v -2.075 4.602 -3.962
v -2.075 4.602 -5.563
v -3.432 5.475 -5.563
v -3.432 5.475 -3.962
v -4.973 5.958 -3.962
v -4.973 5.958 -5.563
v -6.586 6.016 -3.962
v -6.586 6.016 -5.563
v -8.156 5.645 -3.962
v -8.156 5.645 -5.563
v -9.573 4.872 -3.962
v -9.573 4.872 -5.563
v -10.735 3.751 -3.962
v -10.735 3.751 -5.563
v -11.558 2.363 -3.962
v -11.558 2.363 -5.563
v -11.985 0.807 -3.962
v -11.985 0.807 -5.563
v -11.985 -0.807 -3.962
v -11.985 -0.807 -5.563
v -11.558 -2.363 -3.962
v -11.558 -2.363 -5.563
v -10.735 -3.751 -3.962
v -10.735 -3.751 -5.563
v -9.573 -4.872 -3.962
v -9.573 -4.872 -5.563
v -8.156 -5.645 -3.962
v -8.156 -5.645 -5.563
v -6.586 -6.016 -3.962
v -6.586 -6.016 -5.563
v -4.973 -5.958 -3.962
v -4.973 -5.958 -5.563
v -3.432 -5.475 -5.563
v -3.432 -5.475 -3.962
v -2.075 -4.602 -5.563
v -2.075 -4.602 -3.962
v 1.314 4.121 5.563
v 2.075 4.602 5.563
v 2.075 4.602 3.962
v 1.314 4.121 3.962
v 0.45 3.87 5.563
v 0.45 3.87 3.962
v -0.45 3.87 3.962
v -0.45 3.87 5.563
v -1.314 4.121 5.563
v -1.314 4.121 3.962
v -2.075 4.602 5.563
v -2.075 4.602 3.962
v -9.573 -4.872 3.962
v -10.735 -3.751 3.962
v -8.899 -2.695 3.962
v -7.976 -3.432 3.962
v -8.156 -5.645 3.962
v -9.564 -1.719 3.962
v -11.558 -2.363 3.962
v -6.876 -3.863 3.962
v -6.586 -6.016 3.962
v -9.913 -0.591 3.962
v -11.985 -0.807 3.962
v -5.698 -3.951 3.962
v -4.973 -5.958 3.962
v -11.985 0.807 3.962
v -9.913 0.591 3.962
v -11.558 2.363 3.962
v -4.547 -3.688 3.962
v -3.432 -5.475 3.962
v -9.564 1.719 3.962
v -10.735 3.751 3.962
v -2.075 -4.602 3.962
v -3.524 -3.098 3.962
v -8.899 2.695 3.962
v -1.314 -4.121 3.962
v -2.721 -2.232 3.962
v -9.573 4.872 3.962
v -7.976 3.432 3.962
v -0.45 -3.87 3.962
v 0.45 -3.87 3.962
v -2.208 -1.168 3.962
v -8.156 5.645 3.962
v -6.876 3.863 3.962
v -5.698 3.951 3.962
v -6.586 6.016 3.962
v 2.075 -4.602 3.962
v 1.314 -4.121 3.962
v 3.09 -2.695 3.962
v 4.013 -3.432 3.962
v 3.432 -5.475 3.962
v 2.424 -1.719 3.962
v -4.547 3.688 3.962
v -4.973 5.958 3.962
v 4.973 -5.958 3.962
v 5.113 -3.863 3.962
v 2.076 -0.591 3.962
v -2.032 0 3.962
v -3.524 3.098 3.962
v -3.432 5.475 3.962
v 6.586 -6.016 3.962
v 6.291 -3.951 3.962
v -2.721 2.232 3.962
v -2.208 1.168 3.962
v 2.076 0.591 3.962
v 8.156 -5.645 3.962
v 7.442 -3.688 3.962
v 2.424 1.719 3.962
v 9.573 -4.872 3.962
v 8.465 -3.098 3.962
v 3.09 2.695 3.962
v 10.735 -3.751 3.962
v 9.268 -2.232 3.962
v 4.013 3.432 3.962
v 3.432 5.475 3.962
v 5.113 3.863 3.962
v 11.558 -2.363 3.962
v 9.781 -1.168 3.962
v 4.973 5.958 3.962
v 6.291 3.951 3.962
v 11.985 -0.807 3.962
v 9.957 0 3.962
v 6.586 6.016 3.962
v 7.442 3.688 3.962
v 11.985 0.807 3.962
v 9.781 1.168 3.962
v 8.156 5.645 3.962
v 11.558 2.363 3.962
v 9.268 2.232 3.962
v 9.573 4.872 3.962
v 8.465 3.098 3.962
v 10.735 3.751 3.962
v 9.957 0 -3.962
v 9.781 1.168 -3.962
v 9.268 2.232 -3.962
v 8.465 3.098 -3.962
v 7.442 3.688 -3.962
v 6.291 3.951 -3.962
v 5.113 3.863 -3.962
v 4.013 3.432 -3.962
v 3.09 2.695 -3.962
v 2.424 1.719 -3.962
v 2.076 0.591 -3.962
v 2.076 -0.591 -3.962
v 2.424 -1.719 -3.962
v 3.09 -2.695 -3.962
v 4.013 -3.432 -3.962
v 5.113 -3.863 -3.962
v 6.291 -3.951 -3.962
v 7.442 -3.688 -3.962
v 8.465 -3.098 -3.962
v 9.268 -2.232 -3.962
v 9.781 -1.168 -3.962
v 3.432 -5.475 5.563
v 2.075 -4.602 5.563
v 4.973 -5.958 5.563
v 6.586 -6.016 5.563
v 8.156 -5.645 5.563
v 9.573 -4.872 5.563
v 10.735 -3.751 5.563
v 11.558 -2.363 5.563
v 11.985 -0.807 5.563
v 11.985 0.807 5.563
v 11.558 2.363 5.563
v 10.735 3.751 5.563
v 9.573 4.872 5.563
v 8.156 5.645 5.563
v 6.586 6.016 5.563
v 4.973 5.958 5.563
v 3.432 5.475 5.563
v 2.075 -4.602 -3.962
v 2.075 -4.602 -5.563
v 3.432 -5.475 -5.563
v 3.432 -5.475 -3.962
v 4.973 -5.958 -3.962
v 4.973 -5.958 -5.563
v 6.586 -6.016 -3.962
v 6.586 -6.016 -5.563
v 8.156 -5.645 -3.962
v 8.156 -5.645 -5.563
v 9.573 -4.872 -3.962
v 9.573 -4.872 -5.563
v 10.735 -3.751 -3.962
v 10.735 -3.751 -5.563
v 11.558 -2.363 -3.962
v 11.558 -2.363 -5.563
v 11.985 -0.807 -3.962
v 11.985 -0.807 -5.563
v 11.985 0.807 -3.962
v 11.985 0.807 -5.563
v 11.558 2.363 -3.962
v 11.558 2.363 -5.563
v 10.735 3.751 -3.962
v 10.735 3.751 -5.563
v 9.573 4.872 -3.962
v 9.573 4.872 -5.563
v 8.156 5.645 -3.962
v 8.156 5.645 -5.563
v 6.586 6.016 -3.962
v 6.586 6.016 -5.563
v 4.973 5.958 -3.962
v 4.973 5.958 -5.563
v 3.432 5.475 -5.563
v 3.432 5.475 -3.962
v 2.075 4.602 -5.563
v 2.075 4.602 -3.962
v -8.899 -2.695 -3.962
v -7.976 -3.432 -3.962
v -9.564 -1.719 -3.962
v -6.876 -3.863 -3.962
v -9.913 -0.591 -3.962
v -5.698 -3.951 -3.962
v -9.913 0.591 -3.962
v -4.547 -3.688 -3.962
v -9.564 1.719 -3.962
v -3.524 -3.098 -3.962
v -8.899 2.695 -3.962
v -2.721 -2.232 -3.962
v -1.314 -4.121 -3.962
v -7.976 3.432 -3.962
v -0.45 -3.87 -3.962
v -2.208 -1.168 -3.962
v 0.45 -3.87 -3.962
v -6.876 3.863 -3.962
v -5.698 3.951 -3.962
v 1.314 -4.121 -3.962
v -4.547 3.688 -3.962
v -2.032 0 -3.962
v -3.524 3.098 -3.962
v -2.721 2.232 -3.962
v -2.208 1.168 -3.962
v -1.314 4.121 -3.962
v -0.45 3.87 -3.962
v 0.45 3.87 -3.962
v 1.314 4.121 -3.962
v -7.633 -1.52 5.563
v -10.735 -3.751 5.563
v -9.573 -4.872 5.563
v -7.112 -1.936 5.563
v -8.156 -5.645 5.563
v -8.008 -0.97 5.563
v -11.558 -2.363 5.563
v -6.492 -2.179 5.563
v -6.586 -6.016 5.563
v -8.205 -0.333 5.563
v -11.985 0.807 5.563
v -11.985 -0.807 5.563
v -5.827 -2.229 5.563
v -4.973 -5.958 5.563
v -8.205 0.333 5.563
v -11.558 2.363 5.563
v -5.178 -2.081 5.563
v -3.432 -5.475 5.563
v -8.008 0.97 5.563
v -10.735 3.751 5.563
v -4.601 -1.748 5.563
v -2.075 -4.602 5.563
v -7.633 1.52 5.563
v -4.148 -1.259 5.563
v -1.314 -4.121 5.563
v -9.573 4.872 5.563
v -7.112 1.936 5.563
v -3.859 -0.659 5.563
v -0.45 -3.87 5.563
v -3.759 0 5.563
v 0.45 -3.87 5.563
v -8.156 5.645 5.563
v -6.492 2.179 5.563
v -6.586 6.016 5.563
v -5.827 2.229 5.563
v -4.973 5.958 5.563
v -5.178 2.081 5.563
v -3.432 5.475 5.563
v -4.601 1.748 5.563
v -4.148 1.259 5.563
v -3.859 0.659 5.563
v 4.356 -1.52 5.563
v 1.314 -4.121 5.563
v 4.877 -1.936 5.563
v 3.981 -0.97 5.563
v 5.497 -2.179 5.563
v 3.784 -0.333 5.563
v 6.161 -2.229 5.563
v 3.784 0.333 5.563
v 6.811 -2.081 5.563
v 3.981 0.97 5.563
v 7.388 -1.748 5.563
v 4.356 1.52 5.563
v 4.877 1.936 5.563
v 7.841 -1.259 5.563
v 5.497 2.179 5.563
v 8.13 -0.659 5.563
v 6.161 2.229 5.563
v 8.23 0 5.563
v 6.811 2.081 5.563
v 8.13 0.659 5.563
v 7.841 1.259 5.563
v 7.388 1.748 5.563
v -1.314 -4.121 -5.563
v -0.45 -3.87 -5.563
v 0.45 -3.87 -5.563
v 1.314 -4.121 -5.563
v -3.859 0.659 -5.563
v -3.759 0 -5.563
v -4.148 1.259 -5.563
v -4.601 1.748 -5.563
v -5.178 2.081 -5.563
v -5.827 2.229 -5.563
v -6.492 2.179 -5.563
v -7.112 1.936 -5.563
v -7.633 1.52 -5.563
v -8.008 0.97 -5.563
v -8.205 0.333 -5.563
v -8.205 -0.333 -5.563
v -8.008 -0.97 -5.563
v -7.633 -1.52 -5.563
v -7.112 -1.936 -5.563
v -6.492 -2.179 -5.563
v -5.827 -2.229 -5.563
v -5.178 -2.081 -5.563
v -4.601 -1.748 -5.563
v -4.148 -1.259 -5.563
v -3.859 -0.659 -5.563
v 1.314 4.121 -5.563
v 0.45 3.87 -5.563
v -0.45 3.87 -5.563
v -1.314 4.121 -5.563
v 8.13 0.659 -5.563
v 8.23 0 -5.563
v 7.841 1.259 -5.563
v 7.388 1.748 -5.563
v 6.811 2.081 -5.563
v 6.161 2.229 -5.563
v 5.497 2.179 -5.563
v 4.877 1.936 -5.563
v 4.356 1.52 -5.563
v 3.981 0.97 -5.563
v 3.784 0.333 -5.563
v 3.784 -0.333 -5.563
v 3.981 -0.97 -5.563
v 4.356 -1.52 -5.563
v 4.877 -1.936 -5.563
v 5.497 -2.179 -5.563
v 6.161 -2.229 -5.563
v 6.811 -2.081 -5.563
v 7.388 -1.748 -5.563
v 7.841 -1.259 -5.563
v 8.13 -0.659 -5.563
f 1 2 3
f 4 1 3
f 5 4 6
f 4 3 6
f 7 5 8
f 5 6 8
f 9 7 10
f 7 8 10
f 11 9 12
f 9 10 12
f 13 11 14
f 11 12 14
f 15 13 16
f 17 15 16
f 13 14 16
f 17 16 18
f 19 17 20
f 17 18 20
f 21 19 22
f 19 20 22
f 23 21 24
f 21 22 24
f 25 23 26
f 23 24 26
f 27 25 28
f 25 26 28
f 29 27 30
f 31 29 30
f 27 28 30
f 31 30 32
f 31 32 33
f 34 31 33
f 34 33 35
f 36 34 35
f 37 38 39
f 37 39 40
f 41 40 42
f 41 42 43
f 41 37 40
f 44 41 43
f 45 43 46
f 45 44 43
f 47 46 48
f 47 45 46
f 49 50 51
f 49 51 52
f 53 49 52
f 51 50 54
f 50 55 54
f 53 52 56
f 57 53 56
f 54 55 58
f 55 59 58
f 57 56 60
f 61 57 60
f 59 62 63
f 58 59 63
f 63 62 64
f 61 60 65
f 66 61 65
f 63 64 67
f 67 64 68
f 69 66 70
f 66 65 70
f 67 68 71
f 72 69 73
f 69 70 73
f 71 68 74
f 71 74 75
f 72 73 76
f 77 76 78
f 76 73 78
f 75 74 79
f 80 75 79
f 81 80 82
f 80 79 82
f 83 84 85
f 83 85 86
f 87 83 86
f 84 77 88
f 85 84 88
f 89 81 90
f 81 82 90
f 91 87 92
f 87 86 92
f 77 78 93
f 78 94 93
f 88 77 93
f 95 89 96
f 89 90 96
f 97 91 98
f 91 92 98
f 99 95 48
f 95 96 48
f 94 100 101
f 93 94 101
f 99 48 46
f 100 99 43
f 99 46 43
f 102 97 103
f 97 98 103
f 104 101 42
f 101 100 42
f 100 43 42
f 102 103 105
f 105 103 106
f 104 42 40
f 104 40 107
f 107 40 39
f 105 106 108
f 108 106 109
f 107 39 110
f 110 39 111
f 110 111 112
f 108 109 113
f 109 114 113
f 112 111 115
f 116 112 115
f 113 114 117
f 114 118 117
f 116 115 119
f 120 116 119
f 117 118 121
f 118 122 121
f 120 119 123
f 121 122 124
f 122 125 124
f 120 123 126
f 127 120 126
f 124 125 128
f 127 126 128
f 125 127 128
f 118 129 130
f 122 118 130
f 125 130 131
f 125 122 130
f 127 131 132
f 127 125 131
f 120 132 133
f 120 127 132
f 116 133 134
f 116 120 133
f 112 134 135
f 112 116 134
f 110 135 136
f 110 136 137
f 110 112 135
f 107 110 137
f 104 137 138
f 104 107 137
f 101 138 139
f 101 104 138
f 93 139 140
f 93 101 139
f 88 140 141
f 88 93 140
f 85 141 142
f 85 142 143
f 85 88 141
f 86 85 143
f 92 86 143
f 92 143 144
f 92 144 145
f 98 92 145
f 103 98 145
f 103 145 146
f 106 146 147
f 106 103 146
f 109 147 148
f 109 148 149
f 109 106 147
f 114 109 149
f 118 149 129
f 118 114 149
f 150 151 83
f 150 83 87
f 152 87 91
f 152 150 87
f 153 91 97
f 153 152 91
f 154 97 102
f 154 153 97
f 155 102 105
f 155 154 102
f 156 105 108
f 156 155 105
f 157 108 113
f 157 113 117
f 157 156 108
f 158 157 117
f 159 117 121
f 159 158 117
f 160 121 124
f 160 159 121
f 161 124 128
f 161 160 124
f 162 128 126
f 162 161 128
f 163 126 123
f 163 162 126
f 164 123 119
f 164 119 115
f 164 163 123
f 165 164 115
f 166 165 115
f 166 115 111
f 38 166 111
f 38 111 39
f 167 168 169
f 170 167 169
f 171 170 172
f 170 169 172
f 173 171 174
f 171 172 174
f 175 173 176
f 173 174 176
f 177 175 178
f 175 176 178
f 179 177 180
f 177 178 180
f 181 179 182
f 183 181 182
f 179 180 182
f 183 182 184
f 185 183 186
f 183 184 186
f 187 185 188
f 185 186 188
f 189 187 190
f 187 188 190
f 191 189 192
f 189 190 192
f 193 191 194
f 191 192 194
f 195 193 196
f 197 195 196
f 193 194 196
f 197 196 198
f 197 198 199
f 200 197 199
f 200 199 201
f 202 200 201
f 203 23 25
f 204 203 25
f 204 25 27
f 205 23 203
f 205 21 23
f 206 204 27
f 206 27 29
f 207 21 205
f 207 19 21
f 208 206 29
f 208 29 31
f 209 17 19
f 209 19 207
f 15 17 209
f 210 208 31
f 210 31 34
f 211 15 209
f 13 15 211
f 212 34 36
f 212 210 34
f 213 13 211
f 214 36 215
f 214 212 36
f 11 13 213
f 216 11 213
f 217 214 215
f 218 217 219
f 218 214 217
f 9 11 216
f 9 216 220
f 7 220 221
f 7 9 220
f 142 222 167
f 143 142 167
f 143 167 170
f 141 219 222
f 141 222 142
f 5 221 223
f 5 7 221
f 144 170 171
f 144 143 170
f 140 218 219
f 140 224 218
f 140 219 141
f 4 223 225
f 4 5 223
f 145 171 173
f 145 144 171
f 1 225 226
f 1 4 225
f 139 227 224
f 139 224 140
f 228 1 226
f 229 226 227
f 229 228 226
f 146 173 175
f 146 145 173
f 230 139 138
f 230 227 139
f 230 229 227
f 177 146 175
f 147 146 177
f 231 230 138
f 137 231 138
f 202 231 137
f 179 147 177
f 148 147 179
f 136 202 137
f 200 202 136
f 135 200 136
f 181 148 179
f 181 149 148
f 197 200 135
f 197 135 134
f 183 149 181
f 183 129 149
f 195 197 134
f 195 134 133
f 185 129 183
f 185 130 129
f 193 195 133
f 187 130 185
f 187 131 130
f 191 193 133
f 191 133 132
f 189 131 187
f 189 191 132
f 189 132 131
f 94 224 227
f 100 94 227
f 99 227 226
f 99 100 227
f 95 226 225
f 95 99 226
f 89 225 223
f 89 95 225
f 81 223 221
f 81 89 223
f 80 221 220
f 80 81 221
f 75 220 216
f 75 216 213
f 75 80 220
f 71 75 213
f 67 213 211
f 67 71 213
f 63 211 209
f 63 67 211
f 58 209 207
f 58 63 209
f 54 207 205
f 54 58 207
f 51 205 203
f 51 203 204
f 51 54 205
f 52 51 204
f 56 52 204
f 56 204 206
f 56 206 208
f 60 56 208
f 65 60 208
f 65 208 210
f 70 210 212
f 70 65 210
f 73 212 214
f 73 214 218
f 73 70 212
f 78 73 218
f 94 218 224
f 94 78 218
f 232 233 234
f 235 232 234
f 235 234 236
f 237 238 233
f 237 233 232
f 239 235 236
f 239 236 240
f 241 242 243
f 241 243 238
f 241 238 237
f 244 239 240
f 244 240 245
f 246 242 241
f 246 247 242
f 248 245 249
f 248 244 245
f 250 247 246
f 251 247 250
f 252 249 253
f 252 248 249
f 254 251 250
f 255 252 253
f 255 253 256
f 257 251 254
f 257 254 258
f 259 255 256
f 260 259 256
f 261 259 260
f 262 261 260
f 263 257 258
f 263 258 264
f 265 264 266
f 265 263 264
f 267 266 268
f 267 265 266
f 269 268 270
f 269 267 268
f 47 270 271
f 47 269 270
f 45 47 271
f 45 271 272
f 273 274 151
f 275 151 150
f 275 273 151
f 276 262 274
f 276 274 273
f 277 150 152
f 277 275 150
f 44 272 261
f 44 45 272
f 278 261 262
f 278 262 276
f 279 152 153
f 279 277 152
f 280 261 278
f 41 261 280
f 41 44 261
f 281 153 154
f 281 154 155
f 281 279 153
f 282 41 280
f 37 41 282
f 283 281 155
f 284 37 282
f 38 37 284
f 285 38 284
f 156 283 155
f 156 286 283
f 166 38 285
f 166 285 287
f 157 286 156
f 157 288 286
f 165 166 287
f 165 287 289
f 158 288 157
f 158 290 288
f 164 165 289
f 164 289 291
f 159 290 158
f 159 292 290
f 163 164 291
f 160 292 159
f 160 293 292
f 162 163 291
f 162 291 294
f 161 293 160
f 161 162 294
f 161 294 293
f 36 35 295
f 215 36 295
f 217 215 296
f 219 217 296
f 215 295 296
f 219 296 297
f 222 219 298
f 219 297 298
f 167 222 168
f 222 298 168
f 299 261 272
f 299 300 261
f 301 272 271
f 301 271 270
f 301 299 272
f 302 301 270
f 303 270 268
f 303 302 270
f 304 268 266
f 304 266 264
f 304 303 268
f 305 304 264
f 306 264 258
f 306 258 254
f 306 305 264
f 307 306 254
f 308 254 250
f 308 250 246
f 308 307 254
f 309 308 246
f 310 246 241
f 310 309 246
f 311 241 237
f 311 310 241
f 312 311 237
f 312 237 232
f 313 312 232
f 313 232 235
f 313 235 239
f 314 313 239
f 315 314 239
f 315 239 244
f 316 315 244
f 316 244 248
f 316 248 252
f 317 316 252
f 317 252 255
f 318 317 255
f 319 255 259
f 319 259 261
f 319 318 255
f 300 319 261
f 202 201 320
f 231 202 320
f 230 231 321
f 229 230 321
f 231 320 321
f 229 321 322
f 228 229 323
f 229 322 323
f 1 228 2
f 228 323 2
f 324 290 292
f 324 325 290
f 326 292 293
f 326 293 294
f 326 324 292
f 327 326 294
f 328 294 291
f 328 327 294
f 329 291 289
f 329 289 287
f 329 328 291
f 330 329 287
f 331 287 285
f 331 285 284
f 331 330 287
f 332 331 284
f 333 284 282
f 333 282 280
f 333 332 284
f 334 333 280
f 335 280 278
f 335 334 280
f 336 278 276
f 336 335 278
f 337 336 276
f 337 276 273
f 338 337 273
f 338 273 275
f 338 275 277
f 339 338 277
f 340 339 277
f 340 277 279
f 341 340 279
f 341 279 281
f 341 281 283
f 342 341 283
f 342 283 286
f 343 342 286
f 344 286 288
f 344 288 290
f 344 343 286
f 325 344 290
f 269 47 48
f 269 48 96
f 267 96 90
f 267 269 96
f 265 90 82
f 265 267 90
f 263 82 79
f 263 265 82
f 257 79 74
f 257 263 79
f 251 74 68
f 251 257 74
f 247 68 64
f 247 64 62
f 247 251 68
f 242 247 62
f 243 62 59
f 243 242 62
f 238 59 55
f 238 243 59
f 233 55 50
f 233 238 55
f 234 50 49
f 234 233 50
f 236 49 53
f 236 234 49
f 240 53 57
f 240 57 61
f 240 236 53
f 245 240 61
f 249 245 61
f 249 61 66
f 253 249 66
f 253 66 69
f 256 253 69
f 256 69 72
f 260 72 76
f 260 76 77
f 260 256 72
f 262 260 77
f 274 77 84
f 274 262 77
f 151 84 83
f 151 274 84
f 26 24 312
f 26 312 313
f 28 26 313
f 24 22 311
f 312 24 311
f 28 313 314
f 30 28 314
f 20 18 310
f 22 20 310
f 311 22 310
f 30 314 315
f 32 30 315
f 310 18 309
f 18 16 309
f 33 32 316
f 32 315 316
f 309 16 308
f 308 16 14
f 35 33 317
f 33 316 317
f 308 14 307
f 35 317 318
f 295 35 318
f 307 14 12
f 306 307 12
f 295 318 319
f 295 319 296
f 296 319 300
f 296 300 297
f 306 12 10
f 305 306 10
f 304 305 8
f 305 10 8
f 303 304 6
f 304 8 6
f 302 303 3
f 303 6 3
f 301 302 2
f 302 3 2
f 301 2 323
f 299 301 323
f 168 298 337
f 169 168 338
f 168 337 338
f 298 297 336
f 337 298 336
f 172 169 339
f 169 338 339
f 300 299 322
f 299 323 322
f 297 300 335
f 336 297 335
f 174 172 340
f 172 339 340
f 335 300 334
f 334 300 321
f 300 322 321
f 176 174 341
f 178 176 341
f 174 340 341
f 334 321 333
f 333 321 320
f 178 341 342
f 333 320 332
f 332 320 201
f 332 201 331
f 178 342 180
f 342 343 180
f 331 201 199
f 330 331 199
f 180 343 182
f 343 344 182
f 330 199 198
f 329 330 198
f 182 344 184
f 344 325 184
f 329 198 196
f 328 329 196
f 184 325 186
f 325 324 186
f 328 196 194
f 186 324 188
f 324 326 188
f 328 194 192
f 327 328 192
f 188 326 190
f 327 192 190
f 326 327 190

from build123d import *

# Parameters (mm, degrees)
SKETCH1_R             = 3.9624
SKETCH1_R_2           = 2.2352
BOSS_EXTRUDE1_DEPTH   = 5.5626
BOSS_EXTRUDE1_2_DEPTH = 5.5626
SKETCH2_R             = 3.9624
BOSS_EXTRUDE2_DEPTH   = 1.6002


with BuildPart() as part:
    # Sketch1 → Boss-Extrude1 (new body, symmetric)
    with BuildSketch(Plane.XY):
        with Locations((-5.9944, 0)):
            Circle(SKETCH1_R)
        with Locations((-5.9944, 0)):
            Circle(SKETCH1_R_2, mode=Mode.SUBTRACT)
    extrude(amount=BOSS_EXTRUDE1_DEPTH, both=True)



with BuildPart() as body_2:
    # Sketch1 → Boss-Extrude1 2 (new body, symmetric)
    with BuildSketch(Plane.XY):
        with Locations((5.9944, 0)):
            Circle(SKETCH1_R)
        with Locations((5.9944, 0)):
            Circle(SKETCH1_R_2, mode=Mode.SUBTRACT)
    extrude(amount=BOSS_EXTRUDE1_2_DEPTH, both=True)


with BuildPart() as part_1:
    add(part.part)

    add(body_2.part)  # Boss-Extrude2 merges body 2
    # Sketch2 → Boss-Extrude2 (add)
    with BuildSketch(Plane.XY.offset(5.5626)):
        with BuildLine():
            ThreePointArc((-2.074984615, 4.6024587), (-12.0396, 0), (-2.074984615, -4.6024587))
            ThreePointArc((-2.074984615, -4.6024587), (0, -3.838654482), (2.074984615, -4.6024587))
            ThreePointArc((2.074984615, -4.6024587), (12.0396, 0), (2.074984615, 4.6024587))
            ThreePointArc((2.074984615, 4.6024587), (0, 3.838654482), (-2.074984615, 4.6024587))
        make_face()
        with Locations((5.9944, 0)):
            Circle(SKETCH2_R, mode=Mode.SUBTRACT)
        with Locations((-5.9944, 0)):
            Circle(SKETCH2_R, mode=Mode.SUBTRACT)
    boss_extrude2 = extrude(amount=-BOSS_EXTRUDE2_DEPTH)

    # Mirror1: Boss-Extrude2 across plane
    add(boss_extrude2.mirror(Plane.XY))


solid = part_1.part
